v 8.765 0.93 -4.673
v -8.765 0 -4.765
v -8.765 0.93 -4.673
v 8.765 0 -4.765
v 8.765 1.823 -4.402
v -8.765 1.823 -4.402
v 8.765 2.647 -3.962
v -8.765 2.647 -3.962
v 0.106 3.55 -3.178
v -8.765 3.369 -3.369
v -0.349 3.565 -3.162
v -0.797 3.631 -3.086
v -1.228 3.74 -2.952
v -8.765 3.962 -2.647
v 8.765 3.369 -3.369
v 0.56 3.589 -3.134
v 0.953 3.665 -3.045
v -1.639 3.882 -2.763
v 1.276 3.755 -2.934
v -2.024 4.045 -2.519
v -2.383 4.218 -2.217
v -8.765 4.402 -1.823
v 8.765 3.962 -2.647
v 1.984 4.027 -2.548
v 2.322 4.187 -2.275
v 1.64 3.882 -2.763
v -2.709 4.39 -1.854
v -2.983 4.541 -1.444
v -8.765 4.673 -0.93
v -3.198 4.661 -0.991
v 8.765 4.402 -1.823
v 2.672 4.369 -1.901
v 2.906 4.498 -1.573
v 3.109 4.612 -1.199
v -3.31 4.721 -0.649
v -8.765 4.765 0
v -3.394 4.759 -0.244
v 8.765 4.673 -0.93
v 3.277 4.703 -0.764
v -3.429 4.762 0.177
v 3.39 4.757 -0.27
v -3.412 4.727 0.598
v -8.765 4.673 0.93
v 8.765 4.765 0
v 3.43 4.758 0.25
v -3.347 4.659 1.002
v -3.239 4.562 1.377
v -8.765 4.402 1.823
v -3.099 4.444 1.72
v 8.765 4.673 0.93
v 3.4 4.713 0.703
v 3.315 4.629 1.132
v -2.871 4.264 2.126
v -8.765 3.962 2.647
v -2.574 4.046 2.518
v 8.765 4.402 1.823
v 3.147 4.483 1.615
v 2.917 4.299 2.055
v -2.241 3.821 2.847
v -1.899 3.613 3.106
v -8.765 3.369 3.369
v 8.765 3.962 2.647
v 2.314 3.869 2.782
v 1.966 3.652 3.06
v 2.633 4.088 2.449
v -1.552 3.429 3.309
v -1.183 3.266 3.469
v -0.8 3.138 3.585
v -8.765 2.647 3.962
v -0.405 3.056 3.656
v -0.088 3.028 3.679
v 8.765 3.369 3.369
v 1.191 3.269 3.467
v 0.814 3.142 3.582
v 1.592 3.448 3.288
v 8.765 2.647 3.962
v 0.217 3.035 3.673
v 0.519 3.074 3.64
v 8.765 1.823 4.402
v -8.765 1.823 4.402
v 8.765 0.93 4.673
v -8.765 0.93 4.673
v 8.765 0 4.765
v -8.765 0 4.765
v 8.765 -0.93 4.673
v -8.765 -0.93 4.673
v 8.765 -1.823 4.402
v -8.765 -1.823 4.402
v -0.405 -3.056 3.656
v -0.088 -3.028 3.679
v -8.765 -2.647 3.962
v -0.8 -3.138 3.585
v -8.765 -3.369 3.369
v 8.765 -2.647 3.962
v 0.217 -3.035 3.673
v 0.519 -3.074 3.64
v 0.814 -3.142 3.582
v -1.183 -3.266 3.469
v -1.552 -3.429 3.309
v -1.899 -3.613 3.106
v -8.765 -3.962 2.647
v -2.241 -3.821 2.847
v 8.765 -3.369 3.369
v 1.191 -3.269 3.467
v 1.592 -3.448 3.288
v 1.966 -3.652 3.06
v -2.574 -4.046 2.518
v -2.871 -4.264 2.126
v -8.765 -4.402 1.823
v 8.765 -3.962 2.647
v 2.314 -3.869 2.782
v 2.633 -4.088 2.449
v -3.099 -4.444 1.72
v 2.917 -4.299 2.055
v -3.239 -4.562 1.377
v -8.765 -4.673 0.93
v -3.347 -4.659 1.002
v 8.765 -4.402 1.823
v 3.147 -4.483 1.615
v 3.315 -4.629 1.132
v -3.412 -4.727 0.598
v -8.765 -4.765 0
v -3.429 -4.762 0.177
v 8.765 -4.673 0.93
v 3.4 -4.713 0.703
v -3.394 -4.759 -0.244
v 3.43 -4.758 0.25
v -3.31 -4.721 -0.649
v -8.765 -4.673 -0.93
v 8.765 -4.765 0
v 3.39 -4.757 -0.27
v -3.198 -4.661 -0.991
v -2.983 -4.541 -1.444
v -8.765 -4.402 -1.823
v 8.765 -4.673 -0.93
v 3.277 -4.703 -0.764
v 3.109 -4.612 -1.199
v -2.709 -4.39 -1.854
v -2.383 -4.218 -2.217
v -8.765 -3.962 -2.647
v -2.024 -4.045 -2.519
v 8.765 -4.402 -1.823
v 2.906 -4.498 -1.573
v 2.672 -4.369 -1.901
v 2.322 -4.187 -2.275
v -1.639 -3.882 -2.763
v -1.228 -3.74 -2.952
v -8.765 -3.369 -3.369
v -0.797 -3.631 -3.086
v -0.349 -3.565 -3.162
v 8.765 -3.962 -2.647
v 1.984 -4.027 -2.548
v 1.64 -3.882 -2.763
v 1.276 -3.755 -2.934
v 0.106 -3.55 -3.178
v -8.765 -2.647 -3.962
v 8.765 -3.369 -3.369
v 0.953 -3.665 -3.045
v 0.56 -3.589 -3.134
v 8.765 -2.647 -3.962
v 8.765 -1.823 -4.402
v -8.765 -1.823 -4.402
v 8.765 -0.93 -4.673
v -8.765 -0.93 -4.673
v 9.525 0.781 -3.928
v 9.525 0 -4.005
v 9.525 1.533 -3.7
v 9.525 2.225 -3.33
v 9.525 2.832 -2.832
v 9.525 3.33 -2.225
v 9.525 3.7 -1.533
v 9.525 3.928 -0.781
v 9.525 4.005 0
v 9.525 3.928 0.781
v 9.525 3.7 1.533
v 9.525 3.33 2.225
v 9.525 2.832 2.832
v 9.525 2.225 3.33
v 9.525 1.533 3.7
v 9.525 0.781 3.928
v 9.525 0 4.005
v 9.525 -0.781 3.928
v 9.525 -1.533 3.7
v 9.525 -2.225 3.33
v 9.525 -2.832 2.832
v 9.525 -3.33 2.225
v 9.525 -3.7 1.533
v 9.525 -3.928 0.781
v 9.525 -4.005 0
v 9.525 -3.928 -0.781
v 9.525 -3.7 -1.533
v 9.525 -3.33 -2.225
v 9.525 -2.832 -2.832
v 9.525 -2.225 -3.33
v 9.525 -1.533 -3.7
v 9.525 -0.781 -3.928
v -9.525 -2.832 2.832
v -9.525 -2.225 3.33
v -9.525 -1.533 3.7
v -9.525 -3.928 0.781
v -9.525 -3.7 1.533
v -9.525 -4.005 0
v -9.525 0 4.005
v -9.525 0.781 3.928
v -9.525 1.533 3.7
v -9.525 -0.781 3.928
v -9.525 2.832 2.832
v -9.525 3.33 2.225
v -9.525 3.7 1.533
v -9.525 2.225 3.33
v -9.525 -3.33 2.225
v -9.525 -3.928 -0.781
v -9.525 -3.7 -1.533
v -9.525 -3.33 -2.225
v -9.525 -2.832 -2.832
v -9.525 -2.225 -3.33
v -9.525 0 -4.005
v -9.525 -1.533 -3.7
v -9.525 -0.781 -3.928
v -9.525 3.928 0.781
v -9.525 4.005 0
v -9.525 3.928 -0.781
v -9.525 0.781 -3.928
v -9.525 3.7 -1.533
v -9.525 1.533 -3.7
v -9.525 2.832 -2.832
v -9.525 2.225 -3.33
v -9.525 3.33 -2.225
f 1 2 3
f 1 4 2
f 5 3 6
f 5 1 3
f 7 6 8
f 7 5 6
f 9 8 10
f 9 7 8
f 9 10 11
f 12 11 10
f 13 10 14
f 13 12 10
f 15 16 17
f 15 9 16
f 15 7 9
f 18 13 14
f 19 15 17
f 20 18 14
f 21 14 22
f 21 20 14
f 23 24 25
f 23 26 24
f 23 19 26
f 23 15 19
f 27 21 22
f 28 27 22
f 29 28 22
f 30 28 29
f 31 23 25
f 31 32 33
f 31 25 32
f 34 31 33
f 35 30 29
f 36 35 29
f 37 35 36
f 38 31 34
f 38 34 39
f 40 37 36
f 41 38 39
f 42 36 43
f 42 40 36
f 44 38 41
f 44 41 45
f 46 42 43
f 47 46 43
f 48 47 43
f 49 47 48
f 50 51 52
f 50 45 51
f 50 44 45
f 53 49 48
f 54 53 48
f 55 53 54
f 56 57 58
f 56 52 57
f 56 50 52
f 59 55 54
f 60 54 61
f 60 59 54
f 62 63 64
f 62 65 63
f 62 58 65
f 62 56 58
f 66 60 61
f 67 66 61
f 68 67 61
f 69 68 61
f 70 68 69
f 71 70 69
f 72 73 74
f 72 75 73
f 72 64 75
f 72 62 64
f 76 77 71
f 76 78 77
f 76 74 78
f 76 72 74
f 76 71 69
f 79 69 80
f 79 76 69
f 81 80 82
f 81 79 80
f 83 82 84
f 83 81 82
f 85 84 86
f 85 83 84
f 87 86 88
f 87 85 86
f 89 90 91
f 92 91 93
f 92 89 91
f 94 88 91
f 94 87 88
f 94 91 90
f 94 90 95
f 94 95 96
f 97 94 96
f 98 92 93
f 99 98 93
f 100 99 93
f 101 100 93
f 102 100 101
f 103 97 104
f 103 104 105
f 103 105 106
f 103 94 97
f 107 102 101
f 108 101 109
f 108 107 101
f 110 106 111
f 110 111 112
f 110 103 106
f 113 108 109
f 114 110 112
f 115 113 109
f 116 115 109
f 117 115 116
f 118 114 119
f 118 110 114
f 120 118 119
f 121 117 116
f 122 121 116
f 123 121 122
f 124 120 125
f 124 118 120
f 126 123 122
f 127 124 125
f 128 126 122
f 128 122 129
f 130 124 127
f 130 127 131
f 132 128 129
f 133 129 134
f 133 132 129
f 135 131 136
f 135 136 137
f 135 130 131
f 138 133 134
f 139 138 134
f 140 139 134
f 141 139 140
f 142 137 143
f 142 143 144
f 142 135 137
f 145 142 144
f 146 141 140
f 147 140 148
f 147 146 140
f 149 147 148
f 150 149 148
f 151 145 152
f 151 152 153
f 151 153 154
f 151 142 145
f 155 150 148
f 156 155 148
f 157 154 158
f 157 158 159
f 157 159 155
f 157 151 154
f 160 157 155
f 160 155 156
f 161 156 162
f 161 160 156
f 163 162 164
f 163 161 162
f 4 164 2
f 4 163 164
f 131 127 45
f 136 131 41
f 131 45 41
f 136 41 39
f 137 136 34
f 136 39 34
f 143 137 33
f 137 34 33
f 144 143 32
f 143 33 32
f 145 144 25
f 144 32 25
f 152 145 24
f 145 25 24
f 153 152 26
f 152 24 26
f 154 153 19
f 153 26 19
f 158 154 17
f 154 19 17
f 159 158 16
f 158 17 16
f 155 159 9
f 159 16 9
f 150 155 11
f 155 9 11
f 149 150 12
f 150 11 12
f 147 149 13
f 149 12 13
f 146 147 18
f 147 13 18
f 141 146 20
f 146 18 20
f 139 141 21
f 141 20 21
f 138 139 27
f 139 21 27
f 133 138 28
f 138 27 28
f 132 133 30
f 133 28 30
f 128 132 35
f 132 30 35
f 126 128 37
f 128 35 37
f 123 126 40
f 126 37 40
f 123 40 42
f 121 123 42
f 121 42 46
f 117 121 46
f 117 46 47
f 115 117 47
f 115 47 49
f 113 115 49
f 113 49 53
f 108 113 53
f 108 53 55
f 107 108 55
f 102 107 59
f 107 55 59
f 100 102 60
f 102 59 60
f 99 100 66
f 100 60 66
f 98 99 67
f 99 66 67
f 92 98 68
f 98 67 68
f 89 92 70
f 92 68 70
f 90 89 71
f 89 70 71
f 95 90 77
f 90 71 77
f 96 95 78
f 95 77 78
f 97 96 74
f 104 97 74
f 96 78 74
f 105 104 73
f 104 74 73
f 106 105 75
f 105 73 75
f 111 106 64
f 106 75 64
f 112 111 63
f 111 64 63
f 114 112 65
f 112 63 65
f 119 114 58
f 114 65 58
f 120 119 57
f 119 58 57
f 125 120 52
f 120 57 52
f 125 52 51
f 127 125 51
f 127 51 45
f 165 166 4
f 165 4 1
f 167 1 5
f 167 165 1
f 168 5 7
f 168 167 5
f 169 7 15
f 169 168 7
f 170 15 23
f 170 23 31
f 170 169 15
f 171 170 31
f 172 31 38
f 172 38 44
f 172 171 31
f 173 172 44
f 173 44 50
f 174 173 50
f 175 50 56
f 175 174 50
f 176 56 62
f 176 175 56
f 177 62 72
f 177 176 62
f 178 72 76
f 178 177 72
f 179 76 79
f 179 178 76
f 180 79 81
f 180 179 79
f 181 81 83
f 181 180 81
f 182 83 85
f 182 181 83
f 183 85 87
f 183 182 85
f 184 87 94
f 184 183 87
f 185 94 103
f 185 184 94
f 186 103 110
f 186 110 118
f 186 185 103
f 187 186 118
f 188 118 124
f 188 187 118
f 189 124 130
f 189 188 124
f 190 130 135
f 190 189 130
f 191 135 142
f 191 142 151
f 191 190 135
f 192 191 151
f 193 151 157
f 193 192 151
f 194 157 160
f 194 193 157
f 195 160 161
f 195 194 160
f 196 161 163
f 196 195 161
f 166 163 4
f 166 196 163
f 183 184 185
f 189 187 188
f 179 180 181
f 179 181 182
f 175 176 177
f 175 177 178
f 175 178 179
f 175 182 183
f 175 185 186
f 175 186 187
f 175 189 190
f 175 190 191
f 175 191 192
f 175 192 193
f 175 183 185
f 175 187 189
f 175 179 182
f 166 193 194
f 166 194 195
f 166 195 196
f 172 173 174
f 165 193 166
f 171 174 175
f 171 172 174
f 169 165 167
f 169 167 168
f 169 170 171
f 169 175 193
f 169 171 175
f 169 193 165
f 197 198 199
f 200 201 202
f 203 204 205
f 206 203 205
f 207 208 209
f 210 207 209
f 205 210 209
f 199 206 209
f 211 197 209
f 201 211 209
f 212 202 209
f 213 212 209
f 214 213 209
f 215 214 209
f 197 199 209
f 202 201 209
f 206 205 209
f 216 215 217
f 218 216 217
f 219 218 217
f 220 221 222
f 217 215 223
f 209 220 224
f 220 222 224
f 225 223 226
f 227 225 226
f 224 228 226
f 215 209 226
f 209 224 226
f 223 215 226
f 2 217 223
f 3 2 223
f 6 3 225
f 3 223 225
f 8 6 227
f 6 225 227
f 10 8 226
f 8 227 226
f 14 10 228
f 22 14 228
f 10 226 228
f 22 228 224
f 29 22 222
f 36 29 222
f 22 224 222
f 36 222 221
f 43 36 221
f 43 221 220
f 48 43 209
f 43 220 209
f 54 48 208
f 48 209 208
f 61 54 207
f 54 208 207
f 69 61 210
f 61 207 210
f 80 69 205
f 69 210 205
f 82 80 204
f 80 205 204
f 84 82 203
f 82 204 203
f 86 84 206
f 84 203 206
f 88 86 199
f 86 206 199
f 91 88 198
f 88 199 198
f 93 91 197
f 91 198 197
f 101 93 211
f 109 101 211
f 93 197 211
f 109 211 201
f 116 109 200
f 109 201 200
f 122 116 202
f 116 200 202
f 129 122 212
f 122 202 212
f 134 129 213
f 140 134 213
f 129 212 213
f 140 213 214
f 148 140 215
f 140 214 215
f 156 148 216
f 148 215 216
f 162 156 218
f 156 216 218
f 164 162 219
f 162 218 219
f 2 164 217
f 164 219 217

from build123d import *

# Parameters (mm, degrees)
SKETCH1_R           = 4.765
BOSS_EXTRUDE1_DEPTH = 9.525
CHAMFER1_SIZE       = 0.76
SKETCH2_R           = 3.43
CUT_EXTRUDE1_DEPTH  = 9.525


with BuildPart() as part:
    # Sketch1 → Boss-Extrude1 (new body, symmetric)
    with BuildSketch(Plane(origin=(0, 0, 0), x_dir=(0, 0, -1), z_dir=(1, 0, 0))):
        Circle(SKETCH1_R)
    extrude(amount=BOSS_EXTRUDE1_DEPTH, both=True)

    # Chamfer1
    chamfer1_edges = [part.edges().sort_by_distance(p)[0] for p in [
        (-9.525, 0, 4.765),
        (9.525, 0, 4.765),
    ]]
    chamfer(chamfer1_edges, length=CHAMFER1_SIZE)

    # Sketch2 → Cut-Extrude1 (cut, symmetric)
    with BuildSketch(Plane(origin=(0, 0, 0), x_dir=(1, 0, 0), z_dir=(0, 1, 0))):
        with Locations((0, -0.25)):
            Circle(SKETCH2_R)
    extrude(amount=CUT_EXTRUDE1_DEPTH, both=True, mode=Mode.SUBTRACT)


solid = part.part
